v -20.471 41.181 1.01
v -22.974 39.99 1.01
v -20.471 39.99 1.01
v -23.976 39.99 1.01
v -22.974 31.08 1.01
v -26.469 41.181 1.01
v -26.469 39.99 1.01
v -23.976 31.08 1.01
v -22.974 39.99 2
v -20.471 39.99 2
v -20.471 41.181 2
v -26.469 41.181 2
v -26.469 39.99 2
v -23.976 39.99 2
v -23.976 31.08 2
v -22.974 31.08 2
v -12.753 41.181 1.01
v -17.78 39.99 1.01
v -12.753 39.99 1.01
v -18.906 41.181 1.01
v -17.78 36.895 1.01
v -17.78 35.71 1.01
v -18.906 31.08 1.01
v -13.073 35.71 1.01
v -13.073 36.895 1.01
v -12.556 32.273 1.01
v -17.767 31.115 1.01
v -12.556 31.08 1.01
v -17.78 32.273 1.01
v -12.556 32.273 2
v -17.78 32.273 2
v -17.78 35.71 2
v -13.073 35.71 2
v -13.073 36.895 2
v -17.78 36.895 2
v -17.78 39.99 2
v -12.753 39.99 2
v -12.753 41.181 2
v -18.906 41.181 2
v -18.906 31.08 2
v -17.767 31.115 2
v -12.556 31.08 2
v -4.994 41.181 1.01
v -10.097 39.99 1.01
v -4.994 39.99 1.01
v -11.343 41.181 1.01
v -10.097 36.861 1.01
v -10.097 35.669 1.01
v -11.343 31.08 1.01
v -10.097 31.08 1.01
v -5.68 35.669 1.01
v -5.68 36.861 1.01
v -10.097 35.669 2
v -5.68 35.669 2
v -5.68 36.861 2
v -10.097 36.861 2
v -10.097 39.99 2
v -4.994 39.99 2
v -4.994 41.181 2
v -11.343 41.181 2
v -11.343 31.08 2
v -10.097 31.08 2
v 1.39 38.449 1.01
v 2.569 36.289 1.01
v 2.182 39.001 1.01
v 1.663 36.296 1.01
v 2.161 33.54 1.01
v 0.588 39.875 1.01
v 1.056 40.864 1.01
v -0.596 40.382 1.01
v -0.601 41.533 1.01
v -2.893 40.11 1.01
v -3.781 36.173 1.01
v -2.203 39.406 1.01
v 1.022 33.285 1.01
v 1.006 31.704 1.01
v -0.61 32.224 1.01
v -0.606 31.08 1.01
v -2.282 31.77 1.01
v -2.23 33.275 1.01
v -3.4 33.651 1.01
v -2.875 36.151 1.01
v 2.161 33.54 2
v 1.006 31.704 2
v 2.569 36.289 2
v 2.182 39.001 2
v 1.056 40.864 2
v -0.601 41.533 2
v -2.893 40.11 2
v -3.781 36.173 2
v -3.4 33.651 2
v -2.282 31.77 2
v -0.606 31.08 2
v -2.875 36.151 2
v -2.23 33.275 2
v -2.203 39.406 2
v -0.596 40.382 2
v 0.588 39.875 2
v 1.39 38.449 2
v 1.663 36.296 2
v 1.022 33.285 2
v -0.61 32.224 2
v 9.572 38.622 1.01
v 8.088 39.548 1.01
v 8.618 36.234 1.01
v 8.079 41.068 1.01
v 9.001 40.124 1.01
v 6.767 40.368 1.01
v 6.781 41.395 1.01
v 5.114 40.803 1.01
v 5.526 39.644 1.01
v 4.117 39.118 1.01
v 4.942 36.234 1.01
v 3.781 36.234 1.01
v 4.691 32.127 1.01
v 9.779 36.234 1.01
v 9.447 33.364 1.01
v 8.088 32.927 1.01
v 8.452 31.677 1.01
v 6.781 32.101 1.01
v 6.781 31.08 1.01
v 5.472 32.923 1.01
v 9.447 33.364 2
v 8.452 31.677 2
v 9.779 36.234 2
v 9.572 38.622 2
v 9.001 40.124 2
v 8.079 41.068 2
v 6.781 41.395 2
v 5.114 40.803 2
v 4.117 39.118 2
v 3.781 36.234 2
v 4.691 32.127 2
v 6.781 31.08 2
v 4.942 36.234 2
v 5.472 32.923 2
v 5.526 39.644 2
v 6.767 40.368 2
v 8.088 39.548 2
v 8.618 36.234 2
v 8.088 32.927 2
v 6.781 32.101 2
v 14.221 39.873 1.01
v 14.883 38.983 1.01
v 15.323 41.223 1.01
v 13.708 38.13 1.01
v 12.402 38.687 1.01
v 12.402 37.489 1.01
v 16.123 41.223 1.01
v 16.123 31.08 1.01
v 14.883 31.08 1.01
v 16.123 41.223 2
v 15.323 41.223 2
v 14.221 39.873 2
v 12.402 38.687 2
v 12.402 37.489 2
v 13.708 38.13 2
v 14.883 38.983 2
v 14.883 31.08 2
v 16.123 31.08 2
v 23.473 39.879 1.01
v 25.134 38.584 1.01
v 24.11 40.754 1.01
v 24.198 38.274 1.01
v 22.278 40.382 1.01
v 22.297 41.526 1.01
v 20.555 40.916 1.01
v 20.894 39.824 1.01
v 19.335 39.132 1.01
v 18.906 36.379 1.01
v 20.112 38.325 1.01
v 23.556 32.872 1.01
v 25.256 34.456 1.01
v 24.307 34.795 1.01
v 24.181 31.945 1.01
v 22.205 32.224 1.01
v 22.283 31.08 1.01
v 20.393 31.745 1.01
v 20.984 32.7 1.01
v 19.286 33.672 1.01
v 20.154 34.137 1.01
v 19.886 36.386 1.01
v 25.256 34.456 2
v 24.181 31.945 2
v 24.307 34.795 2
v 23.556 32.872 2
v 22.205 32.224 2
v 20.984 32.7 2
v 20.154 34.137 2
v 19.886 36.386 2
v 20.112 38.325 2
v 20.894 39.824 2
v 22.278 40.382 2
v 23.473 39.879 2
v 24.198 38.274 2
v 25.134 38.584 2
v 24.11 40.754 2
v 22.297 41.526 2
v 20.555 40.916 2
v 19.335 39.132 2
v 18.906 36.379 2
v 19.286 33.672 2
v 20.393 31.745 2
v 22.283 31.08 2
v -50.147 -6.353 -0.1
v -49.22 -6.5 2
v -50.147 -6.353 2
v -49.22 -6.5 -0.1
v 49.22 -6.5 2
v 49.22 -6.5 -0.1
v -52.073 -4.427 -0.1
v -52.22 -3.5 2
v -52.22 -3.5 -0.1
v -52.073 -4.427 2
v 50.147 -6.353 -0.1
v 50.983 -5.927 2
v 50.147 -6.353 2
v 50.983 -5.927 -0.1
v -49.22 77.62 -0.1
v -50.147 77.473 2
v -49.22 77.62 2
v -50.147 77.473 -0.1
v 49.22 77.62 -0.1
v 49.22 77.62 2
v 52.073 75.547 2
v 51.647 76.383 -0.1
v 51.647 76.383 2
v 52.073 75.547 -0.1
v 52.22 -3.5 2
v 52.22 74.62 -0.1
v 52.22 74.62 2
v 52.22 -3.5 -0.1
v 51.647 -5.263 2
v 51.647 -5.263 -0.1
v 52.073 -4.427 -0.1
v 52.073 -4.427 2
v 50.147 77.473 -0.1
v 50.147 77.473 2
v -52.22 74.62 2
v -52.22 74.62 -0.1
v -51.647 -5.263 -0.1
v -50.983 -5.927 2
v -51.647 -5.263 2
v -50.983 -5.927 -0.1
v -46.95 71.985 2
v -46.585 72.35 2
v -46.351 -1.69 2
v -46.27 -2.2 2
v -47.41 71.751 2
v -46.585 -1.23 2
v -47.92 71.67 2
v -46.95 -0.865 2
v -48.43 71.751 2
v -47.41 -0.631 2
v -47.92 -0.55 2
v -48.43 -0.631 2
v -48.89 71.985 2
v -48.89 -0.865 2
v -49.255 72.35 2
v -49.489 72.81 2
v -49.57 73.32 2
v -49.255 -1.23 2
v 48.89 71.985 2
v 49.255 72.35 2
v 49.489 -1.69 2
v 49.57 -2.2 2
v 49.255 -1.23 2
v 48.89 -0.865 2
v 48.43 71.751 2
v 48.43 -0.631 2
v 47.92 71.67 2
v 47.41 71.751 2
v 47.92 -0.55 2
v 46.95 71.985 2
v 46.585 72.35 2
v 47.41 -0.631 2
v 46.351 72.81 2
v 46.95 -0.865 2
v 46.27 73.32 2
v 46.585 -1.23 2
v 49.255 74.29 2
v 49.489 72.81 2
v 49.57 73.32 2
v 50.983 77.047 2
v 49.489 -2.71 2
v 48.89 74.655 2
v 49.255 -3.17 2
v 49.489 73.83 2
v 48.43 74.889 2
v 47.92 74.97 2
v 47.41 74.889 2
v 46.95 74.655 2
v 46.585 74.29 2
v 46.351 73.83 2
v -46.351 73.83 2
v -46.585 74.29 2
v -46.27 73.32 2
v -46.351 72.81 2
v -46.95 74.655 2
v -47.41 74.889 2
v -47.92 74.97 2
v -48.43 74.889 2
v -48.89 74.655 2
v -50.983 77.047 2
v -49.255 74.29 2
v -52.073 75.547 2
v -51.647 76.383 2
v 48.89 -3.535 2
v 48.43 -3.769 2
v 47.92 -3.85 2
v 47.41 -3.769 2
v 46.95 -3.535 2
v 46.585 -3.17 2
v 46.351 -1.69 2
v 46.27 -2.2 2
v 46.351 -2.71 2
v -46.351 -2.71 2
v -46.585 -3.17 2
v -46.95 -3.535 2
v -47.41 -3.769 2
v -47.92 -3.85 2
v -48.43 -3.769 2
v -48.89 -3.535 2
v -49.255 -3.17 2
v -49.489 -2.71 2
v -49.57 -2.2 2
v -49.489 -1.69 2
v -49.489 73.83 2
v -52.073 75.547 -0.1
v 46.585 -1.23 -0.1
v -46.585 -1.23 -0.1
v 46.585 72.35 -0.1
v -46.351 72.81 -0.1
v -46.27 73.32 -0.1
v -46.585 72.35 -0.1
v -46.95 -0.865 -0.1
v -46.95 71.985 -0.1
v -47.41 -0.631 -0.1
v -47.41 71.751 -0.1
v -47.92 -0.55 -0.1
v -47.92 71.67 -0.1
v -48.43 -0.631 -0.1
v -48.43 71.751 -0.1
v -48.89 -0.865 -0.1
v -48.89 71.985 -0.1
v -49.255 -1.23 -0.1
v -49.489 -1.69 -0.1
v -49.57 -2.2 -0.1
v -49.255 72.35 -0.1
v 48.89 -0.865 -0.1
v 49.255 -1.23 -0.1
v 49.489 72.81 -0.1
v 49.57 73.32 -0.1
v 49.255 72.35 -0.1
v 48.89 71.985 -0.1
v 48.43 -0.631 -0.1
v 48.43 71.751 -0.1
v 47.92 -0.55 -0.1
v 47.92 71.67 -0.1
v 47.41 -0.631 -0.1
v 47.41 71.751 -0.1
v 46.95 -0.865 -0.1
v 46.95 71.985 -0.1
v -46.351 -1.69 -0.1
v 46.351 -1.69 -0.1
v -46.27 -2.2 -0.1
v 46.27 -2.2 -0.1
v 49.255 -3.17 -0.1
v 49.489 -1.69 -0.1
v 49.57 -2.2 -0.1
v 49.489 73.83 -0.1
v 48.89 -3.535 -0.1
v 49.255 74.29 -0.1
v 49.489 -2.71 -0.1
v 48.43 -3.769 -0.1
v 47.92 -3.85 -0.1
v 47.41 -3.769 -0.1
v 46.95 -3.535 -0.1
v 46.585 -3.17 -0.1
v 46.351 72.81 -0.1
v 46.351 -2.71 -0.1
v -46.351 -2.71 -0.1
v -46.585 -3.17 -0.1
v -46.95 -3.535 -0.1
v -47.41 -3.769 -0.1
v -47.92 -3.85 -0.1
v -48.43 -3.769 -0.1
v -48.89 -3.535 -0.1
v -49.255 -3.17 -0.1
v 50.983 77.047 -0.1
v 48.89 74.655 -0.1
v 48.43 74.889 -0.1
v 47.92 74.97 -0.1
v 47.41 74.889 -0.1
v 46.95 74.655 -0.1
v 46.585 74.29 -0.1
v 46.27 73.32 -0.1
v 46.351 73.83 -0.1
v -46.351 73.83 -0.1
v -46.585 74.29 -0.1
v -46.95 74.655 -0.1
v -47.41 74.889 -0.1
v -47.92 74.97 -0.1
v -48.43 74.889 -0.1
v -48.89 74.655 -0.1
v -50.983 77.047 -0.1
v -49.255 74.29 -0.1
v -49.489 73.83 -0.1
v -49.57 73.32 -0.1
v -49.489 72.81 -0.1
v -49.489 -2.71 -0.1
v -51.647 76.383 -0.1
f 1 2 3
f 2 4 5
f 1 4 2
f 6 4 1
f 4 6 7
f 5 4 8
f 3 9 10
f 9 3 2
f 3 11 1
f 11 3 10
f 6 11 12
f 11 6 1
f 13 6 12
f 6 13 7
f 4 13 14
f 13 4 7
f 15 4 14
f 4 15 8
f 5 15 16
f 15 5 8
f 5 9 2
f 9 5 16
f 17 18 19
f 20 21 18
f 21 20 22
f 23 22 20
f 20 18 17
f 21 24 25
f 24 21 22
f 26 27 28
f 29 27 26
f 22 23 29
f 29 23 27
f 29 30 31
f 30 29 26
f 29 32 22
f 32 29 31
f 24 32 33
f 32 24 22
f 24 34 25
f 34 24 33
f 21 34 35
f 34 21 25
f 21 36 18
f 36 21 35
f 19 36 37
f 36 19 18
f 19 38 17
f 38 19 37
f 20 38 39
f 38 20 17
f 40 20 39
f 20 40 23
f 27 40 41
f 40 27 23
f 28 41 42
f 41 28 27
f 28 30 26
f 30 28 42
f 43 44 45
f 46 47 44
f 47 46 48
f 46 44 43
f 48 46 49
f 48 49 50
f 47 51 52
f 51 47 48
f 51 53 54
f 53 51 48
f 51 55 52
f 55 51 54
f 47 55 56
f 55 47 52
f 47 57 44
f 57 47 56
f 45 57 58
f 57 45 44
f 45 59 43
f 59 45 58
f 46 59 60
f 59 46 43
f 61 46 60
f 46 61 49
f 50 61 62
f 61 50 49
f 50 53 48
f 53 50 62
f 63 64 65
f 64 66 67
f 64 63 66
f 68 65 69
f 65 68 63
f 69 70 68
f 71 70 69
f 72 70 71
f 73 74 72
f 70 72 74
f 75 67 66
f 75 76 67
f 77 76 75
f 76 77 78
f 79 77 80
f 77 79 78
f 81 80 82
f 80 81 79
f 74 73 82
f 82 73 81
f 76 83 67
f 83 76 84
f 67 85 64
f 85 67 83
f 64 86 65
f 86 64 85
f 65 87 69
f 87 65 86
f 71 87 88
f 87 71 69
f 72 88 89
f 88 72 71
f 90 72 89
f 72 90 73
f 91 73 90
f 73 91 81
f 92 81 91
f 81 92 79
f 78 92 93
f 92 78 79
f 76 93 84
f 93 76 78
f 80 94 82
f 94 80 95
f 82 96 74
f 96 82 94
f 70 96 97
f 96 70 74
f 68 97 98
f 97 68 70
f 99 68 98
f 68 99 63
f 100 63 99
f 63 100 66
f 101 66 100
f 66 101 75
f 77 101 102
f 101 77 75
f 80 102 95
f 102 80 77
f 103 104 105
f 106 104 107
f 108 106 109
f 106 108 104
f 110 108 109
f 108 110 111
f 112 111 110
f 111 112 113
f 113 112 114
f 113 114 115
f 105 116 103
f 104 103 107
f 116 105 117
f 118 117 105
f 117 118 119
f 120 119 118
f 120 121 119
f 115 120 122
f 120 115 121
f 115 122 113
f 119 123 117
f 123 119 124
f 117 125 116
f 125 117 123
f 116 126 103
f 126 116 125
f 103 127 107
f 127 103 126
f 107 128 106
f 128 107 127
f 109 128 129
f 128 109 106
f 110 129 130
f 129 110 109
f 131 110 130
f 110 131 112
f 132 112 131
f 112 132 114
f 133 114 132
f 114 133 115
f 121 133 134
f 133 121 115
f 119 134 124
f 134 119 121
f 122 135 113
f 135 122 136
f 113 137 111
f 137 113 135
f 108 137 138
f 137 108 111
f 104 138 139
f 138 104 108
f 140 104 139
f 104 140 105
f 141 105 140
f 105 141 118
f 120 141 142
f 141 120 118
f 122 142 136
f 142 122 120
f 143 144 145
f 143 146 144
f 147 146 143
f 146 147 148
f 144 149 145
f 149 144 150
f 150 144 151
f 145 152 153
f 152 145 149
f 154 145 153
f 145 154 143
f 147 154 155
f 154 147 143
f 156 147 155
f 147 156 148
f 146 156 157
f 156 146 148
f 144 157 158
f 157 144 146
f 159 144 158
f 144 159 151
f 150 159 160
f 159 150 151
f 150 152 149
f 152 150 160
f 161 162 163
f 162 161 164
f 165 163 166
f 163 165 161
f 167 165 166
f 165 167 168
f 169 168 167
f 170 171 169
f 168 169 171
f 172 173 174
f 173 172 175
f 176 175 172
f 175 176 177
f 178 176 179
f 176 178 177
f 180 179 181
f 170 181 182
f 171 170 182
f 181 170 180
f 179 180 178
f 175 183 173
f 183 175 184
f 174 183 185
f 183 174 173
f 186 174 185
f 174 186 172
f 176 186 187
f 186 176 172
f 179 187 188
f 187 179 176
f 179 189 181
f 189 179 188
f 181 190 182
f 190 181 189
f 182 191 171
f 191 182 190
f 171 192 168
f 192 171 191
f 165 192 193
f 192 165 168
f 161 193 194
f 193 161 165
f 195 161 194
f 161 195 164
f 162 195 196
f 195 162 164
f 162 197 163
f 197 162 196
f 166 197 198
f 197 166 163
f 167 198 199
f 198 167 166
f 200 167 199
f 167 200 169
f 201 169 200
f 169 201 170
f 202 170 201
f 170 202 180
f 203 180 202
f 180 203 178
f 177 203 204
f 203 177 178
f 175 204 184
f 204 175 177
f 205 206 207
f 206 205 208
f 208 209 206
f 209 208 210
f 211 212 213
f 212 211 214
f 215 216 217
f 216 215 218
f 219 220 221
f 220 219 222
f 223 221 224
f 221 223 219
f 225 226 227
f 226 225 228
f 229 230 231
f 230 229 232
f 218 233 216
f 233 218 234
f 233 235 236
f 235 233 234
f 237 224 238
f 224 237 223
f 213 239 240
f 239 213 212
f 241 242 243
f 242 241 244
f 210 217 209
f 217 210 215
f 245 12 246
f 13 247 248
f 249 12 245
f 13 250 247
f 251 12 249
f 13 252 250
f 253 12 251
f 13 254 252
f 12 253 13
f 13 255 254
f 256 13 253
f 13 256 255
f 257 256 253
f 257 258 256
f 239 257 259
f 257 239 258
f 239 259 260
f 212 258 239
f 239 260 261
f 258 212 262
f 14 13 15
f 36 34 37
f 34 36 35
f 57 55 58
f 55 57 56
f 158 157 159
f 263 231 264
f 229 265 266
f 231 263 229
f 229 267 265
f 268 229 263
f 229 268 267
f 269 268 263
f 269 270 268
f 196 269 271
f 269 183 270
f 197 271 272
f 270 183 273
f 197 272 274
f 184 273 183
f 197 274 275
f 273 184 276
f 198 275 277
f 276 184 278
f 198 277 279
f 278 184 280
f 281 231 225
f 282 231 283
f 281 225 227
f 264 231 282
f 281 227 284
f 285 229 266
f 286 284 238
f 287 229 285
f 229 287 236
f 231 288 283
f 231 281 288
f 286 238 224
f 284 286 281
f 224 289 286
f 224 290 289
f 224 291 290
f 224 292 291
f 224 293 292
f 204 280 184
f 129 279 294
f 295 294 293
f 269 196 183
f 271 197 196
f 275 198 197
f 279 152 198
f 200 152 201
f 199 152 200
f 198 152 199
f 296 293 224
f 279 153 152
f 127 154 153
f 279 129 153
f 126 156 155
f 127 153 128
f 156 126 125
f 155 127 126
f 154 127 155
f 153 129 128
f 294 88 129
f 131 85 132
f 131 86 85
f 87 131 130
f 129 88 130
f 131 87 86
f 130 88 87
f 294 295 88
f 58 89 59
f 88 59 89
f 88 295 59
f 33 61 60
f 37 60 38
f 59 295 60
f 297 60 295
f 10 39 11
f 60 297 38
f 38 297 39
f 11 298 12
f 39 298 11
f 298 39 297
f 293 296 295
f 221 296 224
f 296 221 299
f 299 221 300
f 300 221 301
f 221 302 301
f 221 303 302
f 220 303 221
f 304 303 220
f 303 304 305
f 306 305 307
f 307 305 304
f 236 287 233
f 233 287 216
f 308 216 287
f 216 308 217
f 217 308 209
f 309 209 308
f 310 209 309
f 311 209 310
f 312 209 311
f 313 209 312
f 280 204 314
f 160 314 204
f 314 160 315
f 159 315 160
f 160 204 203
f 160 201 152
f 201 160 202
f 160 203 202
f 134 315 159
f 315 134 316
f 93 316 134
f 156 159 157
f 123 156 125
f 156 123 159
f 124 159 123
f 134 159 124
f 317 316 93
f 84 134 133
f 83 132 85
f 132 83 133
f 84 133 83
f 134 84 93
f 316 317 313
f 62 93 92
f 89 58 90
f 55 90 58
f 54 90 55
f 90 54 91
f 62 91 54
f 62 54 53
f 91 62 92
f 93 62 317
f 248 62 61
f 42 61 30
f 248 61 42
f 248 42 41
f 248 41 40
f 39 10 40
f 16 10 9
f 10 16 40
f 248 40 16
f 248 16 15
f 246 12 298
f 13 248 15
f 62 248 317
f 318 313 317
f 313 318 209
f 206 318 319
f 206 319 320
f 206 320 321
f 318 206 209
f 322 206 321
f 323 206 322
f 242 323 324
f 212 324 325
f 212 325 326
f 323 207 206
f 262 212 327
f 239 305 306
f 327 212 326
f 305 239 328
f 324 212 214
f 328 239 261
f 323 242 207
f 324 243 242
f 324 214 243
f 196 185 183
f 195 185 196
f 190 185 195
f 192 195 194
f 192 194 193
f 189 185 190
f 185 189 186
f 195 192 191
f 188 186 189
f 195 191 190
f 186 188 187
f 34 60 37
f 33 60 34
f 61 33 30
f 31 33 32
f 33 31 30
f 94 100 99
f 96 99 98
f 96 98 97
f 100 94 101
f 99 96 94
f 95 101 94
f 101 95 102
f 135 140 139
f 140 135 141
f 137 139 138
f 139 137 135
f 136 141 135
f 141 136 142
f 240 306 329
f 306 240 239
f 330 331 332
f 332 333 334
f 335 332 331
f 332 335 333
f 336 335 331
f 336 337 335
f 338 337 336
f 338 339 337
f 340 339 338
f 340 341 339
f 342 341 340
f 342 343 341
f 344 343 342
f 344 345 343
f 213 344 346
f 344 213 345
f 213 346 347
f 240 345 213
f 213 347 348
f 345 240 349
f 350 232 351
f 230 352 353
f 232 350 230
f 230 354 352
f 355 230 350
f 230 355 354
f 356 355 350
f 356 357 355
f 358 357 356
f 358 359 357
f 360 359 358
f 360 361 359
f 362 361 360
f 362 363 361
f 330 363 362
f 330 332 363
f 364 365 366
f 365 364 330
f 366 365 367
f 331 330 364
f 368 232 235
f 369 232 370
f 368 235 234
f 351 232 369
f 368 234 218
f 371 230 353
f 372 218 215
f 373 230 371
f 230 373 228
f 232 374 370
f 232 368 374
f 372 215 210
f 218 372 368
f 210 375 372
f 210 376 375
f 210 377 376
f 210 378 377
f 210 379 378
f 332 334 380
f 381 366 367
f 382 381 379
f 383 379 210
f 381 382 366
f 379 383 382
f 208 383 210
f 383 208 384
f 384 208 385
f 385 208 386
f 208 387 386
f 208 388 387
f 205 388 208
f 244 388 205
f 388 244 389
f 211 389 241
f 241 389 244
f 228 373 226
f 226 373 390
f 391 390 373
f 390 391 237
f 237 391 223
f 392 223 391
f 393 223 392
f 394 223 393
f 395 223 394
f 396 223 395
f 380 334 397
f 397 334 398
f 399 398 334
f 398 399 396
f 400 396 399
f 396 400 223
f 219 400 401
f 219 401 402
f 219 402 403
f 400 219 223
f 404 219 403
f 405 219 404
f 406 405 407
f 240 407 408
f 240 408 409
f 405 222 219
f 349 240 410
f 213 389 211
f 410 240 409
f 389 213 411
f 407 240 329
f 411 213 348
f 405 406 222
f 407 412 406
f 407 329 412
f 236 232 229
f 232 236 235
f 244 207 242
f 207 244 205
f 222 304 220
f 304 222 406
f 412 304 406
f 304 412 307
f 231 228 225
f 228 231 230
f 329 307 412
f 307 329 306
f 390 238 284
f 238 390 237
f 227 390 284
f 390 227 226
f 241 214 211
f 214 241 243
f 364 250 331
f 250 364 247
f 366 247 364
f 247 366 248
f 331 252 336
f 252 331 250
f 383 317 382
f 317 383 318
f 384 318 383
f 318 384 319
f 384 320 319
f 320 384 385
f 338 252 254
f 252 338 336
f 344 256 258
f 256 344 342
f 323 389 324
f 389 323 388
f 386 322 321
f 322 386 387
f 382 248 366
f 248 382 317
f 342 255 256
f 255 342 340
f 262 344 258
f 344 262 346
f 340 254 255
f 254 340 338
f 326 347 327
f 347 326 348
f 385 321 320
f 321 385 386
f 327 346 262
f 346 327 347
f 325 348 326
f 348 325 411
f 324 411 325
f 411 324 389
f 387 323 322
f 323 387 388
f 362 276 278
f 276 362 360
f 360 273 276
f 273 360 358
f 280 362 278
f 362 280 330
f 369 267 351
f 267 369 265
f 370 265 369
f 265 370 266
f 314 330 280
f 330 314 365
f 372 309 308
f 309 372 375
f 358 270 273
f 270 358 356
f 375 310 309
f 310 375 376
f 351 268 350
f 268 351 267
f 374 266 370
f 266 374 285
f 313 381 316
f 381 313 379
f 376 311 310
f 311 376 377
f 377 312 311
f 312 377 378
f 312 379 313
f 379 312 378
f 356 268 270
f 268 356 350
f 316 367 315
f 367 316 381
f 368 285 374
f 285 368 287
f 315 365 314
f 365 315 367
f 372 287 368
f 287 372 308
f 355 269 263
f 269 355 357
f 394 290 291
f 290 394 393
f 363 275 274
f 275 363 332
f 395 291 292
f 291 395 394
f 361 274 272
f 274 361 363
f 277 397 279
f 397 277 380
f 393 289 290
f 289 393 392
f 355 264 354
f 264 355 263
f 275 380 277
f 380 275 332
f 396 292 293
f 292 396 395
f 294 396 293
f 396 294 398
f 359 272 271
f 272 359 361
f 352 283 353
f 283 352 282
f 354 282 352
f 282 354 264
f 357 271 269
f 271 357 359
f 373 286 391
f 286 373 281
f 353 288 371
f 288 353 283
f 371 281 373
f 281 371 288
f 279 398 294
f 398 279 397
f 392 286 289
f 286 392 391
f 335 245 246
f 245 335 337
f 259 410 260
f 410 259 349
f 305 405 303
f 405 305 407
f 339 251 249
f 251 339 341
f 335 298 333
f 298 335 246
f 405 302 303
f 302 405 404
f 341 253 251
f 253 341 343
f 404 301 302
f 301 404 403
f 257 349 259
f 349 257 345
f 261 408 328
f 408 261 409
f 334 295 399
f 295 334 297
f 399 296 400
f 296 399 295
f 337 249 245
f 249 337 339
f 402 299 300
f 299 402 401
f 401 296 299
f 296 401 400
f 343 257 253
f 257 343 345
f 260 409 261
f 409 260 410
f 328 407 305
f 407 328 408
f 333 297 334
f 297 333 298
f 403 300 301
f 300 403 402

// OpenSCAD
// file: ../configuration.scad
//Název boxu (zařízení)
box_jmeno="TEFO01C";

vzdalenost_der = 10.16; //rozteč děr mezi sebou
radidus_hrany = 3; //radius zaobleni sloupku
vzdalenost_od_okraje = 5.2; //vzdalenost stredu upevnovaci diry od kraje desky
pocet_der1 = 8; //pocet děr v ose y
pocet_der2 = 10; //pocet der v ose x



//OBECNE PARAMETRY KRABICKY
//------------------------------------------------------------
//BOCNICE
vyska_bocnice=40;
tloustka_bocnice=3;


//PLBASE PARAMETRY
//------------------------------------------------------------
tloustka_plbase = 2; //tloustka plbase - dna
prekryti_der=0.2; //sila materiálu, který překrývá díry, aby nebyli vidět

plbase_tolerance_horni=0.5; //pro zvětšení tolerance aby tam šlo dát  horní čelíčko


//Rozmery loga MLAB
//------------------------------------------------------------
logo_vyska=0.15;
logo_sirka=0.15;
// file: ../src/manufactury_conf.scad
$fn=20; // model faces resolution.

 //Sroub - podpěra pro tisk sloupku
        vyska_podpery=12;
        vyska_mat_pod_matici=3;

//Sroub - parametry
vyska_hlavy = 3.5;
prumer_hlavy=6;
prumer_sroubu=3.3;

//Matice - parametry
prumer_matice=6; //hrany k hraně
vyska_matice=3;  //vyska matice
posuv_dorazu=1;  //pro moznost posuvu dorazu pro vsunutí matice
matice_sila_materialu=2; //sila materialu pod maticí na ose z


//Lišta parametry
//---------------------------------------------------
//rozměry výrezu v ose y
vzdalenost_od_diry = 5; //vzdalenost od stredu upevnovaci diry na druhou stranu


//Spodní Kryt
vyska_prekryti_spodni=3;
vyska_prekryti_vrchni=4;
prekryti_tolerance=0.6;
tolerance_na_nasunuti=0.3;
sila_spodniho_krytu=1;

//Pro vrchni PLBASE
hrana_bocnice=1.2; //udává jaká síla bocnice zůstane v části zapustěni vrchního čelička
// main file
use <../src/plbase.scad>



include <../src/manufactury_conf.scad>
include <../configuration.scad>


 translate([0,0,tloustka_plbase/2])
rotate(a=[0,0,0])
    {
        
       plbase_vrchni_kryt_pro_odecet(pocet_der1-1,pocet_der2-1,radidus_hrany,vzdalenost_der,vzdalenost_od_okraje,prumer_sroubu,vyska_bocnice,prekryti_der,tloustka_bocnice,plbase_tolerance_horni,tloustka_plbase);
        
     }
